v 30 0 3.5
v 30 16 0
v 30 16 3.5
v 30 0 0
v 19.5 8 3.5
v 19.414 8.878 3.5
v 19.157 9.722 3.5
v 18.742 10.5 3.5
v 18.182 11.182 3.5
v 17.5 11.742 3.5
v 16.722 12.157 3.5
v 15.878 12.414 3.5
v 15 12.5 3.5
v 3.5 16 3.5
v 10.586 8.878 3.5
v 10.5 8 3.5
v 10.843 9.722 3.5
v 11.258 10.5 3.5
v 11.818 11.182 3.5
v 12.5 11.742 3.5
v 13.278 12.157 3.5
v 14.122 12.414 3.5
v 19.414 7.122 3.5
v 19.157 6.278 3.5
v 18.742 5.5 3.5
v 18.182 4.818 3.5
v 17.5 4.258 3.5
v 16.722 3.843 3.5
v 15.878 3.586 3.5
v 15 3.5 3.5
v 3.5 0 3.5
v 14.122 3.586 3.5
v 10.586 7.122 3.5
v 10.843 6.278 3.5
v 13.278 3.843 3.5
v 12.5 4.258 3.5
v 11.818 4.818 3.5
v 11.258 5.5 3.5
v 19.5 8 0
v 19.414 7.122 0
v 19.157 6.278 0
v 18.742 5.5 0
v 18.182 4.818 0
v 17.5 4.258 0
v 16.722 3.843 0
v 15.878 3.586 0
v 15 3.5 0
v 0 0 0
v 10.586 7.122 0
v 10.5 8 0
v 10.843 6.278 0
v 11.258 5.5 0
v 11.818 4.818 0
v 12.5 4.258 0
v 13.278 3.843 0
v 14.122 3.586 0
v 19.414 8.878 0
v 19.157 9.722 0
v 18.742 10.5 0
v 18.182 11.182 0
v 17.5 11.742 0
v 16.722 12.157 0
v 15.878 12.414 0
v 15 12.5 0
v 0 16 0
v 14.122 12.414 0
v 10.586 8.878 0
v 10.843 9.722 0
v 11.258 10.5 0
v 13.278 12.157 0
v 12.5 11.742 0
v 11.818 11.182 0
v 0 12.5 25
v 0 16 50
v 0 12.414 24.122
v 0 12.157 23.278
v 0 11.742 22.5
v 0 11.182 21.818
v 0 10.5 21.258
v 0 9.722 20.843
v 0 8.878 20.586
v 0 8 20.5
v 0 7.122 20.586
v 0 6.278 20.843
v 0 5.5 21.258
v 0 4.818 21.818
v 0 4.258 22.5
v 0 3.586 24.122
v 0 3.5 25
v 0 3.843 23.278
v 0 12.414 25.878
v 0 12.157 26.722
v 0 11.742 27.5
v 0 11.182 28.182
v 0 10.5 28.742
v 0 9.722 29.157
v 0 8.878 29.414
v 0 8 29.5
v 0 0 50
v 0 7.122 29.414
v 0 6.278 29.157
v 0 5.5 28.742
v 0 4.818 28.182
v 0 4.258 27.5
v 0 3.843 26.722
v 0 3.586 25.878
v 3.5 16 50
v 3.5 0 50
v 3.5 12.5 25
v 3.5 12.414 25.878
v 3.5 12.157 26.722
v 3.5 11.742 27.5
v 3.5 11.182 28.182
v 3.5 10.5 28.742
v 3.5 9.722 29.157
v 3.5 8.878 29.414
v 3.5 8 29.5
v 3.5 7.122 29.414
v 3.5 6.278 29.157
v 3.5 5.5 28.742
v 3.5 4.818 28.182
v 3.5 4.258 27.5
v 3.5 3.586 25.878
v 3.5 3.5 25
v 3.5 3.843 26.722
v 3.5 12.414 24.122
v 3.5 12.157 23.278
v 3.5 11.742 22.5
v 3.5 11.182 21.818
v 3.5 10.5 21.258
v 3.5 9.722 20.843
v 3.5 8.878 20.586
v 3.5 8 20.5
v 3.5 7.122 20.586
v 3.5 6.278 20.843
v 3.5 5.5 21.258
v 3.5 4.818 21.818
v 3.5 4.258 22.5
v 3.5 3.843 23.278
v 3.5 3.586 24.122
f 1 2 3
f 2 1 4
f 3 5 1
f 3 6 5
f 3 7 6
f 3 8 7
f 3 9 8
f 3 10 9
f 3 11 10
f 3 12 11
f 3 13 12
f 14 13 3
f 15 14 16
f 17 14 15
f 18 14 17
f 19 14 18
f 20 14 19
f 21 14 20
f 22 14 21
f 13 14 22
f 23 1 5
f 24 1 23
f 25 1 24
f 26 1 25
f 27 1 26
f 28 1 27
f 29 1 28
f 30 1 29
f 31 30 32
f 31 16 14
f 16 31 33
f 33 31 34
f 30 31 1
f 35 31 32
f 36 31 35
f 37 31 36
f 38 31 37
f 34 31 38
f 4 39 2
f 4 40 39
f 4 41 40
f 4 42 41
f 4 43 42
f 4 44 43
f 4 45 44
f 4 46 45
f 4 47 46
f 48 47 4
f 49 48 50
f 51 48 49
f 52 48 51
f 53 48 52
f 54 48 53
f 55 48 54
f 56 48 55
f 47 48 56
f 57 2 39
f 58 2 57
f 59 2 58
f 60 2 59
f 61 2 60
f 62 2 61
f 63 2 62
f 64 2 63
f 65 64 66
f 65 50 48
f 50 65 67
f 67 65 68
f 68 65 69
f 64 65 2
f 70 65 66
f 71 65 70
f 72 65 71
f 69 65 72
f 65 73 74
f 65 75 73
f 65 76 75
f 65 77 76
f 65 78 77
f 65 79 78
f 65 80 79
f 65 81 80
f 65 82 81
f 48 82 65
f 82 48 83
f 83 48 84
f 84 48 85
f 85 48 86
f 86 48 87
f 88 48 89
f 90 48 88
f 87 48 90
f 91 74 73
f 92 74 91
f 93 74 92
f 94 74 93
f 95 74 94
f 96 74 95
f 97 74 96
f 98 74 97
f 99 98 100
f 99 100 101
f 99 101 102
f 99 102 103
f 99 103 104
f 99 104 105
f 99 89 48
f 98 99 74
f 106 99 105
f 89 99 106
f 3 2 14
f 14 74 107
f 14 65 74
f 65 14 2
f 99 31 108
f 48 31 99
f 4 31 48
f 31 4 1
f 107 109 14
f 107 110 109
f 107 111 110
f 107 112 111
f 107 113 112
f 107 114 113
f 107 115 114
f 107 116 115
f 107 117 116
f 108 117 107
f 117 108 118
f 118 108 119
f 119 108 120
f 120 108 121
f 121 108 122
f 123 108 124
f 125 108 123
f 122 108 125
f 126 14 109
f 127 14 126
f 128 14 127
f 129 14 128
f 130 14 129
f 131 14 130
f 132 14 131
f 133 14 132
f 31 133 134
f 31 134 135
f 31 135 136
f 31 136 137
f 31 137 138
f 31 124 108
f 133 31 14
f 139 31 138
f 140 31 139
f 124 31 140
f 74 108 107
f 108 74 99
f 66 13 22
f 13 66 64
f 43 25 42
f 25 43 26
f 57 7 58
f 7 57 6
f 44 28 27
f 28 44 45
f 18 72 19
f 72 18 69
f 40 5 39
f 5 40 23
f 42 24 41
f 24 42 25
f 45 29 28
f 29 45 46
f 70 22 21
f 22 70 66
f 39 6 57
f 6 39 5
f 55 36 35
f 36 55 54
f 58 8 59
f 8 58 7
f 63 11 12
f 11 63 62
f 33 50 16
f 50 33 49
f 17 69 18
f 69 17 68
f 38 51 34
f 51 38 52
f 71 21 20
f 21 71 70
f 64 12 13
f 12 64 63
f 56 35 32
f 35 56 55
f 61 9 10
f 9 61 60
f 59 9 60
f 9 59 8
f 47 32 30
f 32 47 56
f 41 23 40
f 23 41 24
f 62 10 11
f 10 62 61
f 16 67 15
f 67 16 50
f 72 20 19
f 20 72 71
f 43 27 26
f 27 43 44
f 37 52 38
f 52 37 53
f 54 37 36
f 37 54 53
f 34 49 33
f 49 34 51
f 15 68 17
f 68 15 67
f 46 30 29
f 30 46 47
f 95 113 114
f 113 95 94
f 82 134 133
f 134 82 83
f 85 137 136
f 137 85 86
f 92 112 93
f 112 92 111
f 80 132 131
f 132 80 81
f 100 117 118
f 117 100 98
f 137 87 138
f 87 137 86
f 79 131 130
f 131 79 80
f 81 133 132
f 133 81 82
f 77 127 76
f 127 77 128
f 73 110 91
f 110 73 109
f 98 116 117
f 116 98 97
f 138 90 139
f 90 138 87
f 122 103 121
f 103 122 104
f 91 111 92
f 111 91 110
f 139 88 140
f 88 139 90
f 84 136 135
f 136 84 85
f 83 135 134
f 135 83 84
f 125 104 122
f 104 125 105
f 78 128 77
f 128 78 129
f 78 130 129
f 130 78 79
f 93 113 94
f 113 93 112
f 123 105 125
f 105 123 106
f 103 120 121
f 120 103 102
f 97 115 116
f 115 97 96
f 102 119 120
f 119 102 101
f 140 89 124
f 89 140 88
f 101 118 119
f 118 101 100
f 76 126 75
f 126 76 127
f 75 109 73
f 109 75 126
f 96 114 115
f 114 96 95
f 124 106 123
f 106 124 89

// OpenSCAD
$fn = 32;

// ----------------------------------------------------------------------
// L-bracket: 30 x 16 x 50 mm
// ----------------------------------------------------------------------

// --- parameters (mm) ---
arm_x = 30;               // horizontal leg, X
arm_z = 50;               // vertical leg, Z
width = 16;               // bracket depth, Y
wall = 3.5;               // plate thickness
hole_d = 9;               // clearance for M8

module hole_z(px, py) {
  translate([px, py, -0.5]) cylinder(h = wall + 1, d = hole_d);
}
module hole_x(pz, py) {
  translate([-0.5, py, pz]) rotate([0, 90, 0]) cylinder(h = wall + 1, d = hole_d);
}

difference() {
  union() {
    /* horizontal leg */
    cube([arm_x, width, wall]);
    /* vertical leg, overlapping the corner block */
    cube([wall, width, arm_z]);
  }
  hole_z(15, 8);
  hole_x(25, 8);
}
